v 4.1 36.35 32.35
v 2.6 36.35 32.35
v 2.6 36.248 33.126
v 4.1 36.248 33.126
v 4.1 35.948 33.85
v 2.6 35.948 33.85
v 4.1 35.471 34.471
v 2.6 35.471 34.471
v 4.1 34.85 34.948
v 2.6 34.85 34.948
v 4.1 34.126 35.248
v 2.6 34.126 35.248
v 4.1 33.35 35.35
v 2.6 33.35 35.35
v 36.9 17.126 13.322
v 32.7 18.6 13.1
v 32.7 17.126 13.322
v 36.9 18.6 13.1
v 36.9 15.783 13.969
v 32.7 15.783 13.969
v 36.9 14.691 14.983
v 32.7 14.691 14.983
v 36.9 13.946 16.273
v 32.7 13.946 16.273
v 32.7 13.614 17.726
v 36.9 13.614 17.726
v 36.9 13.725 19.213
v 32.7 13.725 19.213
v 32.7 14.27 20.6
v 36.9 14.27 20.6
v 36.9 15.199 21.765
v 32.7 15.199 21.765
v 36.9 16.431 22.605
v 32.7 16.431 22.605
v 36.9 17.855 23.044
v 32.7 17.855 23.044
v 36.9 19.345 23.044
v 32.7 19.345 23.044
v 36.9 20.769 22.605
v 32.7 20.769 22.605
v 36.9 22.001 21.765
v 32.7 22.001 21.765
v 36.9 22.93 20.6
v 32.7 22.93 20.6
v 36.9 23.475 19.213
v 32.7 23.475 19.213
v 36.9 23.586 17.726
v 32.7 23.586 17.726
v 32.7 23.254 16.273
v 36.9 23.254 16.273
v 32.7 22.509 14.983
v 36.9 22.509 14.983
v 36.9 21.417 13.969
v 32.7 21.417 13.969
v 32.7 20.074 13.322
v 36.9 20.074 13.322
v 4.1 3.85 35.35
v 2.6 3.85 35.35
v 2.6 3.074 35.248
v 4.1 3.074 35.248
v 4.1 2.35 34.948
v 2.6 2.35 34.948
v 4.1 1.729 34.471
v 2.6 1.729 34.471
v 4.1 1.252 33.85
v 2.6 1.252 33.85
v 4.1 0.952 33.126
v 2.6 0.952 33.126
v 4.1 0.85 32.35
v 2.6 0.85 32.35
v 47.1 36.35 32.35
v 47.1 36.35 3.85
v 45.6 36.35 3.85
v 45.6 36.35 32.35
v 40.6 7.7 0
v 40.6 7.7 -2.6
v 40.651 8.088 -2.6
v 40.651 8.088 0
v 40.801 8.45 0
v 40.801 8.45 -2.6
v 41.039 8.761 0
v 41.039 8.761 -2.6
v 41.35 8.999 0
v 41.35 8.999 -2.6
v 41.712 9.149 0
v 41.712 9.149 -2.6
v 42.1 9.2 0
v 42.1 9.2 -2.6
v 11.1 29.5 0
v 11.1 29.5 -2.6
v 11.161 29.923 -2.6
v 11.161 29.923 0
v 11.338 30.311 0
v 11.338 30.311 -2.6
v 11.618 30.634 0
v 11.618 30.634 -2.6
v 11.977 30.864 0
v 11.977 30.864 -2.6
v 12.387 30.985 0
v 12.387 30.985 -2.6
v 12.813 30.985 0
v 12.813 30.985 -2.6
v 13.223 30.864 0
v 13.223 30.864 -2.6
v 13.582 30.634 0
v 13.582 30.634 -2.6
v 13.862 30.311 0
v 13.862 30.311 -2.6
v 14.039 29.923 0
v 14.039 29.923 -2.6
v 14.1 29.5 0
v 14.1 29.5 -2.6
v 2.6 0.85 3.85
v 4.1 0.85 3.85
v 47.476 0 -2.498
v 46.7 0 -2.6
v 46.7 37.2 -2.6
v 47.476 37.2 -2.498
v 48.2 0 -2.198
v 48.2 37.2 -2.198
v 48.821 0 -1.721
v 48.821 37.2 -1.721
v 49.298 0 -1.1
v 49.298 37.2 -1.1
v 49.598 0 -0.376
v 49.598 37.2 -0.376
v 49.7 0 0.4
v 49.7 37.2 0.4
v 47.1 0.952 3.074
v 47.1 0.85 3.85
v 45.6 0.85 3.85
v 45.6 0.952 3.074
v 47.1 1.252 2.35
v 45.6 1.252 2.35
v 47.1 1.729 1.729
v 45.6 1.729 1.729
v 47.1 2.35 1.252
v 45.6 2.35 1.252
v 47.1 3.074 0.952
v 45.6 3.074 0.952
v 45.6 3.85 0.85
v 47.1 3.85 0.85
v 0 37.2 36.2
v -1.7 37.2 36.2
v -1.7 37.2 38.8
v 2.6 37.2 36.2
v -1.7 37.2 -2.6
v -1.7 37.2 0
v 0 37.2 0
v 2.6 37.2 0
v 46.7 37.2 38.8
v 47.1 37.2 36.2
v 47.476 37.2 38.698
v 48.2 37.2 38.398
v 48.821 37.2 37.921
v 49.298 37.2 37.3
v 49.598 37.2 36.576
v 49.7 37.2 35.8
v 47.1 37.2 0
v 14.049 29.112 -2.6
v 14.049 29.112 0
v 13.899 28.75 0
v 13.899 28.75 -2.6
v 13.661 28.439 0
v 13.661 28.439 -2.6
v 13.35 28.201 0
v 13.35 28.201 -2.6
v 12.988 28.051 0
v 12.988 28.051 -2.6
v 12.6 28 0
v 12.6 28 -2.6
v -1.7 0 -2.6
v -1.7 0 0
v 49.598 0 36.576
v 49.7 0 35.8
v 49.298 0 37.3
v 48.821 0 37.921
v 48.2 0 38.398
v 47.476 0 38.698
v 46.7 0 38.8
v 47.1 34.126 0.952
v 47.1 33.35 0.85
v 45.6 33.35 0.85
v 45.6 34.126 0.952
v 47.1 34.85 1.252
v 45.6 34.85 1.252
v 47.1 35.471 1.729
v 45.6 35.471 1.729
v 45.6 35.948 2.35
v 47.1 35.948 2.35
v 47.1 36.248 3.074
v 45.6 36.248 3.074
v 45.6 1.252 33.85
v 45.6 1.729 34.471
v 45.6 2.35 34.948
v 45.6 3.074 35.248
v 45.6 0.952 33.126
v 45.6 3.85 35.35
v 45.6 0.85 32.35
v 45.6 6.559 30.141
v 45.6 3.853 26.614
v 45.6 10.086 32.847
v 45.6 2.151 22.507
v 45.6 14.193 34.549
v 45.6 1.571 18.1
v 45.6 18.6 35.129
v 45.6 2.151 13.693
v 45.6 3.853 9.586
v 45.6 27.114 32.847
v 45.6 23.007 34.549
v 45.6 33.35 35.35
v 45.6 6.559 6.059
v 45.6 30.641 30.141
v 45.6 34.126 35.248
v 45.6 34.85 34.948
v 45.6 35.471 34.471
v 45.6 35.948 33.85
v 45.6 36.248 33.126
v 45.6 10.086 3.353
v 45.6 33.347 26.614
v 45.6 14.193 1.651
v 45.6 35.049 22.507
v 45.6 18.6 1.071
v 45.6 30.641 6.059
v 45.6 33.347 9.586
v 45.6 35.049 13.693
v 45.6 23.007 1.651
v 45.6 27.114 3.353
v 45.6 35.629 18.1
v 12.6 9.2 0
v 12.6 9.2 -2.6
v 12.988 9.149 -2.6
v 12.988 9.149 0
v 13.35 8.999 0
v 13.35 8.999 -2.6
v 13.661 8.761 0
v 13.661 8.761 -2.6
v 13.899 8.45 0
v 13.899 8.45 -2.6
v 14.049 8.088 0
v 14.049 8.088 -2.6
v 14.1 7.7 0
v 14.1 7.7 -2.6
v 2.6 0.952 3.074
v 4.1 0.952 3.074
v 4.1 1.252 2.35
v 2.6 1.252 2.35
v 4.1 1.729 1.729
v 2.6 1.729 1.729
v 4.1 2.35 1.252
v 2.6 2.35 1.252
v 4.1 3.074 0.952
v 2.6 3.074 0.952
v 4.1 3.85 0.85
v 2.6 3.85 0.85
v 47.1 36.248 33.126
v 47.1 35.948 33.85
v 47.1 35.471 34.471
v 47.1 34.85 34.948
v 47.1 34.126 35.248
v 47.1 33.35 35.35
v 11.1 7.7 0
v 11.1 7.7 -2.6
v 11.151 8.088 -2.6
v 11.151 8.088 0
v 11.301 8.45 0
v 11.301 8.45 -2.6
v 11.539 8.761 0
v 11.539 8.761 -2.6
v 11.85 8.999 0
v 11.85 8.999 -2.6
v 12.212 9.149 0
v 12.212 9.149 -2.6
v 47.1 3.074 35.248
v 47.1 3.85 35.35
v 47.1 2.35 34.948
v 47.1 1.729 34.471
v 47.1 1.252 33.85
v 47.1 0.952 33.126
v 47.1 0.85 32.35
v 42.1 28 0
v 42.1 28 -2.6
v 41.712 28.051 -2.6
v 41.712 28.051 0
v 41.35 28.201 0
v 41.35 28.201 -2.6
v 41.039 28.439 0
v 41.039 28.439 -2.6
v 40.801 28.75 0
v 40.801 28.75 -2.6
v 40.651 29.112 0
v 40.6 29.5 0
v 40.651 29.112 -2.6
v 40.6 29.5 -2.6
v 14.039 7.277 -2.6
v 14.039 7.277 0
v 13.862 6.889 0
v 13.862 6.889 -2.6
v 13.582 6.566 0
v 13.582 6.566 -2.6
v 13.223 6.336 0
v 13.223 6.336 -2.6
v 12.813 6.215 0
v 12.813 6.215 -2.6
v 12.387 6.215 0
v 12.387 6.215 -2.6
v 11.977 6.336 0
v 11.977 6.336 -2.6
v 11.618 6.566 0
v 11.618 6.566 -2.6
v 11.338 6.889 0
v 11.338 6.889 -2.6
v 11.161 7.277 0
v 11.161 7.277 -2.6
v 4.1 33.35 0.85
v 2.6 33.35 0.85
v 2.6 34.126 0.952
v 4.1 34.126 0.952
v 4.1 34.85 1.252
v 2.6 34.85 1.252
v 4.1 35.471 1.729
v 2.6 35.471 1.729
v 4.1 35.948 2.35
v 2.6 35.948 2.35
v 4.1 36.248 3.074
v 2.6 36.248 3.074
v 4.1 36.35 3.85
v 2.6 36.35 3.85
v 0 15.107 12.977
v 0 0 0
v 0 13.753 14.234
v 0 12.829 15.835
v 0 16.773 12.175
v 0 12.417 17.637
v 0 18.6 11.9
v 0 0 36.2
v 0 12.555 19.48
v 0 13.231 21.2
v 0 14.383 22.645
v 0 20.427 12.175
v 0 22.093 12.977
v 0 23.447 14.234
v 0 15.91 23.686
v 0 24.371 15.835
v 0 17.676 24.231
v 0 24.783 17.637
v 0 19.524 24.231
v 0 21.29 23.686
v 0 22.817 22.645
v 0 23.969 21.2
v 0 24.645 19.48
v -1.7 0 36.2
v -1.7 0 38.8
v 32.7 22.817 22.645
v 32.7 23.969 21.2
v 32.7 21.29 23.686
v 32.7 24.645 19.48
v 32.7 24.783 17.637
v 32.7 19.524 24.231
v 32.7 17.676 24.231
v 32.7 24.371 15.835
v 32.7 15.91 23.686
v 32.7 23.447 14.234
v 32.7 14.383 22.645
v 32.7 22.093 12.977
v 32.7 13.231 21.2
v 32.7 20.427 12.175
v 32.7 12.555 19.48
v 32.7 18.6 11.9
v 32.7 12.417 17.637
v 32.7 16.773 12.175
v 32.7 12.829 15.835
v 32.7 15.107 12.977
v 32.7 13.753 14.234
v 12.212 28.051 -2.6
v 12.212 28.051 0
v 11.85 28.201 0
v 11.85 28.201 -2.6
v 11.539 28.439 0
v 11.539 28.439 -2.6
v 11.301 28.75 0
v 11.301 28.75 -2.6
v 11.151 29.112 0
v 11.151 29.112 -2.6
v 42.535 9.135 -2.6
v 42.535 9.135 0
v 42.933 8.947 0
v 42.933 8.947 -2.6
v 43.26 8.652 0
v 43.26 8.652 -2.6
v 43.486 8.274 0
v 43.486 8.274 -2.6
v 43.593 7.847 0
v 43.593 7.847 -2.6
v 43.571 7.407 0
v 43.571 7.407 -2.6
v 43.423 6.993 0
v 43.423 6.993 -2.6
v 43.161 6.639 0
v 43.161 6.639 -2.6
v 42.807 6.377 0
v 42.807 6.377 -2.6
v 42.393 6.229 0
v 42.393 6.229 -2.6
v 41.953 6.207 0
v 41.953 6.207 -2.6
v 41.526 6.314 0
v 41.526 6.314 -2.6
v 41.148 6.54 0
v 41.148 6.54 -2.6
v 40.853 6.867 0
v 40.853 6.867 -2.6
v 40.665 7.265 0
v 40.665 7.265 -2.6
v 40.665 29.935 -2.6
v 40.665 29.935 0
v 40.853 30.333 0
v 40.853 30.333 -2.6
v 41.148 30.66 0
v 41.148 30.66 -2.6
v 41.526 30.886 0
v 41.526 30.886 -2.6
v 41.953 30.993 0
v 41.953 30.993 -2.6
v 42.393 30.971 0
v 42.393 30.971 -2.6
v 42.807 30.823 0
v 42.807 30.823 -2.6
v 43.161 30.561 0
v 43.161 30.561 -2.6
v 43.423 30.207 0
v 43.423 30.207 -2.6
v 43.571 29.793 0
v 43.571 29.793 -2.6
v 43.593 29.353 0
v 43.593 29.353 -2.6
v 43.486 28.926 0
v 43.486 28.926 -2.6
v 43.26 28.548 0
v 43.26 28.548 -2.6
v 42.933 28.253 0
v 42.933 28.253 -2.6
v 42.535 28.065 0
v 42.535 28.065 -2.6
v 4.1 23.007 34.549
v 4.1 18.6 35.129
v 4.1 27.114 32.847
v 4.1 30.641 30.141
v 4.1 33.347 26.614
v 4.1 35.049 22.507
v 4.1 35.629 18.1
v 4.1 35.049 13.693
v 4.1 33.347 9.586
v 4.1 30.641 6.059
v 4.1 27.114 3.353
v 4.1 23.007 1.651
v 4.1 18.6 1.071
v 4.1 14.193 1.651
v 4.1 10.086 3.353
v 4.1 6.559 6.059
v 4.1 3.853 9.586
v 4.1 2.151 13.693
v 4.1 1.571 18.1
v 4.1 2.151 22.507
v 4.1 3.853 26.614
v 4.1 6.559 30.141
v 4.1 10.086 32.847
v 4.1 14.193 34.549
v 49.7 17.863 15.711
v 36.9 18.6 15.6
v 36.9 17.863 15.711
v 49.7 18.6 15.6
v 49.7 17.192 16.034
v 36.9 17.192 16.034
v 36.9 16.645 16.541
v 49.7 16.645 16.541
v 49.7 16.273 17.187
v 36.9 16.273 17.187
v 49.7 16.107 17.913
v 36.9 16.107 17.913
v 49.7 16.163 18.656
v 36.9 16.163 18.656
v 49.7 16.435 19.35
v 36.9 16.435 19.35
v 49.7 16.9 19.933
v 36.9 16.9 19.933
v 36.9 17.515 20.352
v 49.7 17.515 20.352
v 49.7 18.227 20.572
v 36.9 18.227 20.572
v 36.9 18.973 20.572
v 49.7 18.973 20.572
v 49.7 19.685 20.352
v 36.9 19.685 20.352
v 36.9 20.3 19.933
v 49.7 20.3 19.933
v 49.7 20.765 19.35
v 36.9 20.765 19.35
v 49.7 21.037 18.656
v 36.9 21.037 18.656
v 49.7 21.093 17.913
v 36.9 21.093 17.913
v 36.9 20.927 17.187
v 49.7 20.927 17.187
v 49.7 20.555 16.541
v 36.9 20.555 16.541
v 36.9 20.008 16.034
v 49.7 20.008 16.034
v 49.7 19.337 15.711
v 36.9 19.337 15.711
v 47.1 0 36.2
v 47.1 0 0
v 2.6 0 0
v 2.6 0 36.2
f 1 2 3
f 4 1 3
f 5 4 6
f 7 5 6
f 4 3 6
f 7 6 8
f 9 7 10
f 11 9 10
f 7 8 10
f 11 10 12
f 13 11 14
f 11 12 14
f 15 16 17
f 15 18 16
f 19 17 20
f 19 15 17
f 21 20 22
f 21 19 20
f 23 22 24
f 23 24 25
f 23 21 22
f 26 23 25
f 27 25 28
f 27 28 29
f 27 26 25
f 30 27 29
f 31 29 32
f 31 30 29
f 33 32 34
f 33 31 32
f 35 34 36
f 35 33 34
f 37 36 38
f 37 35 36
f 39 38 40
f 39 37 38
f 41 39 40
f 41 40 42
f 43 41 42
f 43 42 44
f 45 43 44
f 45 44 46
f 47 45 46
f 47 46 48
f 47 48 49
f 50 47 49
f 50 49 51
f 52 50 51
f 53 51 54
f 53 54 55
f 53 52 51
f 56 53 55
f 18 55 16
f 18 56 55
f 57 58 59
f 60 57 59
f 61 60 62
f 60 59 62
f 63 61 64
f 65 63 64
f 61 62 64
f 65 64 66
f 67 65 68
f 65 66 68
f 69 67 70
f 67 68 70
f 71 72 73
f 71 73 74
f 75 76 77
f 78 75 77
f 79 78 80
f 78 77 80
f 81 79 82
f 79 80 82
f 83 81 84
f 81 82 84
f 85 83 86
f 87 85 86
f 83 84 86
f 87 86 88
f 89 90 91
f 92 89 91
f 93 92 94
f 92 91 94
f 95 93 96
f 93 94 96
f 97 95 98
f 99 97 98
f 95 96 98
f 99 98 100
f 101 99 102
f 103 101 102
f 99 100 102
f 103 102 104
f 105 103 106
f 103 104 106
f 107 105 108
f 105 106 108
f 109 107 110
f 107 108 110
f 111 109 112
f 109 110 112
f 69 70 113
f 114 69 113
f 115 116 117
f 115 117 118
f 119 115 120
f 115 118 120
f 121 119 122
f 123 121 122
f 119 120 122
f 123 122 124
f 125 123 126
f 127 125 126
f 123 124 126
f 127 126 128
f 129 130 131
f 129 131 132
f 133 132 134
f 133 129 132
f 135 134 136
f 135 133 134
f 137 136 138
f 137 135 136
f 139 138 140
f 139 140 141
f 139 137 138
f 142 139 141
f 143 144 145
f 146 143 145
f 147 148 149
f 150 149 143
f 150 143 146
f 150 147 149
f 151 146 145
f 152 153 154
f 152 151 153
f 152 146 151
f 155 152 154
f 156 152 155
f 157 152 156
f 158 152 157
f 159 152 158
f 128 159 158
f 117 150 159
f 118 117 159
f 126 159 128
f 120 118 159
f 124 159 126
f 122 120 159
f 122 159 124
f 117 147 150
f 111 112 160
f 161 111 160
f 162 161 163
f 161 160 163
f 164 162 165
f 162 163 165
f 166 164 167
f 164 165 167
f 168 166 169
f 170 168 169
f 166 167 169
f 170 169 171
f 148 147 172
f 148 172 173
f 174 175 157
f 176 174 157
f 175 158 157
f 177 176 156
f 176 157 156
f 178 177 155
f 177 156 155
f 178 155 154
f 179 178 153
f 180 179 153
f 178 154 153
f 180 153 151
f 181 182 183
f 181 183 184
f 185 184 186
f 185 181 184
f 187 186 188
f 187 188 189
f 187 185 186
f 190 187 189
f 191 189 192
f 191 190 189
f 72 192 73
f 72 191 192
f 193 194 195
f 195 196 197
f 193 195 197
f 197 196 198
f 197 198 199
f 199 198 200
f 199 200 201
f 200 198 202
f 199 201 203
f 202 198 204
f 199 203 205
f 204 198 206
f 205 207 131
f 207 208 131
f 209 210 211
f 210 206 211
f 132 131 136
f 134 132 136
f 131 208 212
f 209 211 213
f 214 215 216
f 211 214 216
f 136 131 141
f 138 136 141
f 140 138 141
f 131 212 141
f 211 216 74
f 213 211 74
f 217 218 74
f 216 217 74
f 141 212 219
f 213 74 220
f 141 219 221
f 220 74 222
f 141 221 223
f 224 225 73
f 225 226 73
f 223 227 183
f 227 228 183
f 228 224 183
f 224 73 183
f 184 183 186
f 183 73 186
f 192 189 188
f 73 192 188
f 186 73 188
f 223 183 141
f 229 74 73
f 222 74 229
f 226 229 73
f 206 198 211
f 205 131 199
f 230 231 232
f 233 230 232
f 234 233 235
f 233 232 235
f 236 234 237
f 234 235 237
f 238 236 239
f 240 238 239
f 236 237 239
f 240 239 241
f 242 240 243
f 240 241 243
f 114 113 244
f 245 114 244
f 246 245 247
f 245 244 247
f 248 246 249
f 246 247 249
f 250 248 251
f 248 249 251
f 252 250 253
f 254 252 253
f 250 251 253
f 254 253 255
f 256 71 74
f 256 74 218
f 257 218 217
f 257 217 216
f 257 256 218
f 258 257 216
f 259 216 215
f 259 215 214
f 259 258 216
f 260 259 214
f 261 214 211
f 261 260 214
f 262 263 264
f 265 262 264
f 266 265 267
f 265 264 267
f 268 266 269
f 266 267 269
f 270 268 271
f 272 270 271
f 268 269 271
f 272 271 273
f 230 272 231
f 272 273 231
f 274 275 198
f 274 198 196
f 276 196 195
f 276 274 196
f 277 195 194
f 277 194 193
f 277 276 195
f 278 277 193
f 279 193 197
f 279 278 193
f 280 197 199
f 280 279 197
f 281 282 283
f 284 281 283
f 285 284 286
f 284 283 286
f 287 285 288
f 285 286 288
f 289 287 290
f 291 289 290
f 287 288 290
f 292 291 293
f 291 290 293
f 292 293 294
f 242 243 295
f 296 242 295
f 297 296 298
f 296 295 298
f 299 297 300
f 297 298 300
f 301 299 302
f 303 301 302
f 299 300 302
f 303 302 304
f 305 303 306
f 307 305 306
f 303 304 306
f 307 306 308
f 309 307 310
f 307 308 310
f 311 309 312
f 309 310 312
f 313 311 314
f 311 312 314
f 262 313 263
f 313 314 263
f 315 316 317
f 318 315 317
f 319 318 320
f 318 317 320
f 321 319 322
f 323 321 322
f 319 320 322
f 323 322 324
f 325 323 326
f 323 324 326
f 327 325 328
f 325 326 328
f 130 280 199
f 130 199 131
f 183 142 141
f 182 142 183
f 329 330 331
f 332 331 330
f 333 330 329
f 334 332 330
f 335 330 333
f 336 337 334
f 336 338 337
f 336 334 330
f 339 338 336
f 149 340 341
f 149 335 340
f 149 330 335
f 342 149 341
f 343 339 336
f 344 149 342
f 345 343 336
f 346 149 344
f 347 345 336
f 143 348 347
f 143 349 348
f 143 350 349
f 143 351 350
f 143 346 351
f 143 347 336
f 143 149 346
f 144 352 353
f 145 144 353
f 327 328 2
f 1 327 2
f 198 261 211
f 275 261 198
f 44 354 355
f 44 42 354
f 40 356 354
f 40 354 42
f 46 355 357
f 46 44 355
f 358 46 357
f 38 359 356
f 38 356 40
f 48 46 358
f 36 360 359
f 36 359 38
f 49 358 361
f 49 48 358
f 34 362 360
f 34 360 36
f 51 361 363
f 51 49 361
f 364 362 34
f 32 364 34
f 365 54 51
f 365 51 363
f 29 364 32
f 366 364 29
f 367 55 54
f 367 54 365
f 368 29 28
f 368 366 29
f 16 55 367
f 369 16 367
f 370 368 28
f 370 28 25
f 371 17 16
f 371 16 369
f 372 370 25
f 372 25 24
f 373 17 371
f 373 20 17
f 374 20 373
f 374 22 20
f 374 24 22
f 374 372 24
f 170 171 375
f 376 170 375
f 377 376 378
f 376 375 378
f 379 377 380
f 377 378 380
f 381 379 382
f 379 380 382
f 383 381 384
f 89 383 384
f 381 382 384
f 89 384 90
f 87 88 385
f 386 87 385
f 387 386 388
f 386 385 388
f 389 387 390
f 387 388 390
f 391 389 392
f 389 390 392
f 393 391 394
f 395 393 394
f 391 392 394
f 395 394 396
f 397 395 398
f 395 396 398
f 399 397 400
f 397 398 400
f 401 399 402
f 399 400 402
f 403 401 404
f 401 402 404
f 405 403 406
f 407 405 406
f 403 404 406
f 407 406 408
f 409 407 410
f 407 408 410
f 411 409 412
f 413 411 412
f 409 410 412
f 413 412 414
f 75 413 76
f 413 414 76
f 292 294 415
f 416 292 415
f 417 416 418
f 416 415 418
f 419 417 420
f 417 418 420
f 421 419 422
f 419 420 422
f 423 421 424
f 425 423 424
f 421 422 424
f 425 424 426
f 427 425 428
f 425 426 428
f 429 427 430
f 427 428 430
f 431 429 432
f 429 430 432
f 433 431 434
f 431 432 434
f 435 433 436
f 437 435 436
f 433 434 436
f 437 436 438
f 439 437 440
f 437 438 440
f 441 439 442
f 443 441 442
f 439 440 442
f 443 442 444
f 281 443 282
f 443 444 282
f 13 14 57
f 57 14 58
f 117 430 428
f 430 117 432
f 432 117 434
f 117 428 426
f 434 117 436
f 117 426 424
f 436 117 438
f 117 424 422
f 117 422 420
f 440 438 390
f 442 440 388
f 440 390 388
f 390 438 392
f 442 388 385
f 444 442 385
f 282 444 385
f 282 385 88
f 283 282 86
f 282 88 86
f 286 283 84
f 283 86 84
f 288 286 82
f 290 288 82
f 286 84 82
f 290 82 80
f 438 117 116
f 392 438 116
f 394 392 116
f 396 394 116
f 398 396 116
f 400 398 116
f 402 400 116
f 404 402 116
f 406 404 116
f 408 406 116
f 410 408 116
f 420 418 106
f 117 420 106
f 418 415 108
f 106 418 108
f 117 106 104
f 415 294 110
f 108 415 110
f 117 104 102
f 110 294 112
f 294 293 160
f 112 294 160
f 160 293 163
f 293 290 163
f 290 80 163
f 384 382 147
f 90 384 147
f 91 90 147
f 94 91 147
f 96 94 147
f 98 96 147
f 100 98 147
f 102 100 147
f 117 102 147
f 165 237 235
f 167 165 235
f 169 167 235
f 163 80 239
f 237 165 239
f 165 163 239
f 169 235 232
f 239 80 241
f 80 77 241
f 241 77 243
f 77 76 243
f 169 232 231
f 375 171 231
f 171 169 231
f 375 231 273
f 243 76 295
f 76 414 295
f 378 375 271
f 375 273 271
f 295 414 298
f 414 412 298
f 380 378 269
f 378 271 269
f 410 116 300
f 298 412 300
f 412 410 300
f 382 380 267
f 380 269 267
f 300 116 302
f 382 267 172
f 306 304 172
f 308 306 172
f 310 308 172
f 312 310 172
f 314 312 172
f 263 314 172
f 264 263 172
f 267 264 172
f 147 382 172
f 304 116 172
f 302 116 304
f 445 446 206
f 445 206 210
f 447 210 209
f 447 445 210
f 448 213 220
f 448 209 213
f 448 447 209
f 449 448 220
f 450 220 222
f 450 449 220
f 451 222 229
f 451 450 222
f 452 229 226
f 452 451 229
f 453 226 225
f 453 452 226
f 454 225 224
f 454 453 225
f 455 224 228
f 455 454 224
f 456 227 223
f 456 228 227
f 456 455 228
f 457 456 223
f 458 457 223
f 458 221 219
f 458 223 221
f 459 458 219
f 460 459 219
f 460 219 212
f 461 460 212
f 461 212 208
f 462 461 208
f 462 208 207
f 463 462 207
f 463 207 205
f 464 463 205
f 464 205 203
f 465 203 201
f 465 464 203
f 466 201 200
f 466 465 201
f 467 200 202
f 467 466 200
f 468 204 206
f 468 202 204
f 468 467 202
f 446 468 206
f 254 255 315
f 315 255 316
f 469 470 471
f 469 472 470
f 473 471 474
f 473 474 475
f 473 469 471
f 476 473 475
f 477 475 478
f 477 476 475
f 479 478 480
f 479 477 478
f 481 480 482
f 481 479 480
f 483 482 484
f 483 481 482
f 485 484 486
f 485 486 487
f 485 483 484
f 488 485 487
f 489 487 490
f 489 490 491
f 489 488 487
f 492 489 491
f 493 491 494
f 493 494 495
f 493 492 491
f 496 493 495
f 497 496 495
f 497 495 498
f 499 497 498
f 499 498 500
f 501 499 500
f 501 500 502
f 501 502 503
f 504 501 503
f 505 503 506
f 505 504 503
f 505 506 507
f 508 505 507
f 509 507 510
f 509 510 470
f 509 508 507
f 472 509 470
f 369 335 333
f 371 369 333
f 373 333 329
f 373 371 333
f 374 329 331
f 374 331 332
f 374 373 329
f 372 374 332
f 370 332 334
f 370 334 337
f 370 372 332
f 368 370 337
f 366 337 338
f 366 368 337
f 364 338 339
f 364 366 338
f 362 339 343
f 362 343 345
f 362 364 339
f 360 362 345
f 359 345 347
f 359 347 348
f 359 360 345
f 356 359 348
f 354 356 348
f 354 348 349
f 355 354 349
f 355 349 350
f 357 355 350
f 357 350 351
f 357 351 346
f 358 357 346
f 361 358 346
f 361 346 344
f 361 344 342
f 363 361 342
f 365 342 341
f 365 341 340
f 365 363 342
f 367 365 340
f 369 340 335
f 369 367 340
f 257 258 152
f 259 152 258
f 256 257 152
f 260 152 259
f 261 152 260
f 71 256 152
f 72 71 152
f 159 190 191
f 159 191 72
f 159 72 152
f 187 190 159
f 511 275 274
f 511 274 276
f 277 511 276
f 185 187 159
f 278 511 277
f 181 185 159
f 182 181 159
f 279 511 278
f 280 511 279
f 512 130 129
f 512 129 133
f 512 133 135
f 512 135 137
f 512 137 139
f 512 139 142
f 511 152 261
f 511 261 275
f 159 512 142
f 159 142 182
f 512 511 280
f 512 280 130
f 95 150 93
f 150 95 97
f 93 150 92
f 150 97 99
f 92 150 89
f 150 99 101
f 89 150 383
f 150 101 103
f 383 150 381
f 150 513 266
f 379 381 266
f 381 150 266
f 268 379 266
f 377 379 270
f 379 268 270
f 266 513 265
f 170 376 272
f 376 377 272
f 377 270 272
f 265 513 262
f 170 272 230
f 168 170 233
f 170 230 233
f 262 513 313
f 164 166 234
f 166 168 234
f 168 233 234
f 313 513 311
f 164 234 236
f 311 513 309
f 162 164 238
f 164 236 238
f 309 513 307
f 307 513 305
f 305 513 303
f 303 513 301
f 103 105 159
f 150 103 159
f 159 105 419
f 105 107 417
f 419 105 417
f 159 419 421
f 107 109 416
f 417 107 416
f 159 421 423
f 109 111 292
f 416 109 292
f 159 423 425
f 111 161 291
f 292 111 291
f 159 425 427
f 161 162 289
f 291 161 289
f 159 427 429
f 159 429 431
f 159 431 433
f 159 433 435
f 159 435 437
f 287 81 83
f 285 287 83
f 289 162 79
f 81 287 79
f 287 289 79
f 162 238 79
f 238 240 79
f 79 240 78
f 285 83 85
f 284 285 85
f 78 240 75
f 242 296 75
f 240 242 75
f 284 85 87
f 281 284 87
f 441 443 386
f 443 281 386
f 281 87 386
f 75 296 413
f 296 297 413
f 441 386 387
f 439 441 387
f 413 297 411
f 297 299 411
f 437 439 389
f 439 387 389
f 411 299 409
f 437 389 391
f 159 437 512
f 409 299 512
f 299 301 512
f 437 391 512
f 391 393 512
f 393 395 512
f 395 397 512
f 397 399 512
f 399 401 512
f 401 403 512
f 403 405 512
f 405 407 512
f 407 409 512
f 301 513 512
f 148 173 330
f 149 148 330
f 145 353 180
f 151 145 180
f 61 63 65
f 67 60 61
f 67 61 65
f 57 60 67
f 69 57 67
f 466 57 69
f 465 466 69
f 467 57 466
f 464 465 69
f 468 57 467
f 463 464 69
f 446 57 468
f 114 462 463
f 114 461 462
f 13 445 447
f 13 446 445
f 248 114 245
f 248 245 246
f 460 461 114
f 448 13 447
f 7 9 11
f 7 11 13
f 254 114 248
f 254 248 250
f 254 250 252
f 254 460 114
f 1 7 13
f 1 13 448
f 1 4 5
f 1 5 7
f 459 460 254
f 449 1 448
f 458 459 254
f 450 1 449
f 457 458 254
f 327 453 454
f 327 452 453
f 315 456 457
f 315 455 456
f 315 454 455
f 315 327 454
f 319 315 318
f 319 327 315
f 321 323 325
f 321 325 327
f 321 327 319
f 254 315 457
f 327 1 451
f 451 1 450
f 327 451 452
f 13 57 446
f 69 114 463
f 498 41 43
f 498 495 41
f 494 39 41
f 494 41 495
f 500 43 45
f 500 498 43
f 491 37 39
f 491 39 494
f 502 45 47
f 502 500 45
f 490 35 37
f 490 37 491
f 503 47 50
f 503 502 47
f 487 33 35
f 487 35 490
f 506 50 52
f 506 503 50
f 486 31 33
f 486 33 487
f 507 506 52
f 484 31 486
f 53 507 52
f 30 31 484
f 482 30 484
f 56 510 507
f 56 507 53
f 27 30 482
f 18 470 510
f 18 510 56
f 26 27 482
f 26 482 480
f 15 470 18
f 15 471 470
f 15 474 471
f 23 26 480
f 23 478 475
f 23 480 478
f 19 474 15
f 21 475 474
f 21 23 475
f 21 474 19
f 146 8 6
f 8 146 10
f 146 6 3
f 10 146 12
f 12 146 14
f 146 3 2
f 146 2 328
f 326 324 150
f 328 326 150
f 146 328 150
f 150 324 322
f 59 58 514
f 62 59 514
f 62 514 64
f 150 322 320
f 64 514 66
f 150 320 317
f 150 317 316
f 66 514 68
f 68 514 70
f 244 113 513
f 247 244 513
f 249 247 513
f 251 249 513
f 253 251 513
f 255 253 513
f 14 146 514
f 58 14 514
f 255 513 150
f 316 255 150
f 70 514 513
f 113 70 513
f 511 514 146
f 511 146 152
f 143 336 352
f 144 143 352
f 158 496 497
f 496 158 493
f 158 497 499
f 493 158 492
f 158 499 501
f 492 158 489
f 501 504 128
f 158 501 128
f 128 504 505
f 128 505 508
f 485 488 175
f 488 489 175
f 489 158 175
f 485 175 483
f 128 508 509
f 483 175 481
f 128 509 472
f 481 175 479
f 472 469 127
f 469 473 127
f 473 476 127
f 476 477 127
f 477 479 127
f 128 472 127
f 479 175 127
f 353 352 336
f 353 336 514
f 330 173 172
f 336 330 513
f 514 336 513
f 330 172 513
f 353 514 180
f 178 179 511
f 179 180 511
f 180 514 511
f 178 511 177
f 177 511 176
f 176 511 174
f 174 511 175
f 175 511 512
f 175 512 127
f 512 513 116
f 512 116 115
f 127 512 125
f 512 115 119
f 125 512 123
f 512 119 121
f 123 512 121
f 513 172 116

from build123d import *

# Parameters (mm, degrees)
CROQUIS1_W              = 44.5
CROQUIS1_H              = 36.2
SALIENTE_EXTRUIR1_DEPTH = 37.2
CROQUIS2_R              = 17.028823748
SALIENTE_EXTRUIR2_DEPTH = 47.1
CROQUIS3_R              = 17.028823748
SALIENTE_EXTRUIR3_DEPTH = 1.5
REDONDEO1_R             = 3
REDONDEO2_R             = 3
CORTAR_EXTRUIR1_DEPTH   = 2.6


with BuildPart() as part:
    # Croquis1 → Saliente-Extruir1 (new body)
    with BuildSketch(Plane(origin=(0, 0, 0), x_dir=(1, 0, 0), z_dir=(0, 1, 0))):
        Polygon((0, 0), (0, -36.2), (-1.7, -36.2), (-1.7, -38.8), (49.7, -38.8), (49.7, 2.6), (-1.7, 2.6), (-1.7, 0), align=None)
        with Locations((24.85, -18.1)):
            Rectangle(CROQUIS1_W, CROQUIS1_H, mode=Mode.SUBTRACT)
    extrude(amount=SALIENTE_EXTRUIR1_DEPTH)

    # Croquis2 → Saliente-Extruir2 (add)
    with BuildSketch(Plane.ZY):
        with Locations((18.1, 18.6)):
            Circle(CROQUIS2_R)
    extrude(amount=-SALIENTE_EXTRUIR2_DEPTH)

    # Croquis3 → Saliente-Extruir3 (add)
    with BuildSketch(Plane(origin=(2.6, 0, 0), x_dir=(0, 0, -1), z_dir=(1, 0, 0))):
        with BuildLine():
            Line((-0.85, 3.85), (-0.85, 33.35))
            ThreePointArc((-0.85, 33.35), (-1.728679656, 35.471320344), (-3.85, 36.35))
            Line((-3.85, 36.35), (-32.35, 36.35))
            ThreePointArc((-32.35, 36.35), (-34.471320344, 35.471320344), (-35.35, 33.35))
            Line((-35.35, 33.35), (-35.35, 3.85))
            ThreePointArc((-35.35, 3.85), (-34.471320344, 1.728679656), (-32.35, 0.85))
            Line((-32.35, 0.85), (-3.85, 0.85))
            ThreePointArc((-3.85, 0.85), (-1.728679656, 1.728679656), (-0.85, 3.85))
        make_face()
        with Locations(Location((-18.1, 18.6, 0), (0, 0, 180))):
            Circle(CROQUIS3_R, mode=Mode.SUBTRACT)
    saliente_extruir3 = extrude(amount=SALIENTE_EXTRUIR3_DEPTH)

    # Simetría1: Saliente-Extruir3 across plane
    add(saliente_extruir3.mirror(Plane(origin=(24.85, 0, 0), x_dir=(0, 0, 1), z_dir=(1, 0, 0))))

    # Croquis4 → Cortar-Revolución1 (revolve, cut)
    with BuildSketch(Plane(origin=(0, 18.6, 0), x_dir=(1, 0, 0), z_dir=(0, 1, 0))):
        Polygon((49.7, -18.1), (0, -18.1), (0, -11.9), (32.7, -11.9), (32.7, -13.1), (36.9, -13.1), (36.9, -15.6), (49.7, -15.6), align=None)
    revolve(axis=Axis((49.7, 18.6, 18.1), (-1, 0, 0)), mode=Mode.SUBTRACT)

    # Redondeo1
    redondeo1_edges = [part.edges().sort_by_distance(p)[0] for p in [
        (49.7, 18.6, -2.6),
    ]]
    fillet(redondeo1_edges, radius=REDONDEO1_R)

    # Redondeo2
    redondeo2_edges = [part.edges().sort_by_distance(p)[0] for p in [
        (49.7, 18.6, 38.8),
    ]]
    fillet(redondeo2_edges, radius=REDONDEO2_R)

    # Croquis5 → Cortar-Extruir1 (cut)
    with BuildSketch(Plane(origin=(0, 0, -2.6), x_dir=(-1, 0, 0), z_dir=(0, 0, -1))):
        with BuildLine():
            Line((-42.1, 28), (-42.1, 29.5))
            Line((-42.1, 29.5), (-40.6, 29.5))
            ThreePointArc((-40.6, 29.5), (-43.160660172, 30.560660172), (-42.1, 28))
        make_face()
        with BuildLine():
            Line((-40.6, 29.5), (-42.1, 29.5))
            Line((-42.1, 29.5), (-42.1, 28))
            ThreePointArc((-42.1, 28), (-41.039339828, 28.439339828), (-40.6, 29.5))
        make_face()
        with BuildLine():
            ThreePointArc((-40.6, 7.7), (-41.039339828, 8.760660172), (-42.1, 9.2))
            Line((-42.1, 9.2), (-42.1, 7.7))
            Line((-42.1, 7.7), (-40.6, 7.7))
        make_face()
        with BuildLine():
            Line((-42.1, 7.7), (-42.1, 9.2))
            ThreePointArc((-42.1, 9.2), (-43.160660172, 6.639339828), (-40.6, 7.7))
            Line((-40.6, 7.7), (-42.1, 7.7))
        make_face()
        with BuildLine():
            ThreePointArc((-11.1, 7.7), (-11.539339828, 8.760660172), (-12.6, 9.2))
            Line((-12.6, 9.2), (-12.6, 7.7))
            Line((-12.6, 7.7), (-14.1, 7.7))
            ThreePointArc((-14.1, 7.7), (-12.6, 6.2), (-11.1, 7.7))
        make_face()
        with BuildLine():
            Line((-12.6, 7.7), (-12.6, 9.2))
            ThreePointArc((-12.6, 9.2), (-13.660660172, 8.760660172), (-14.1, 7.7))
            Line((-14.1, 7.7), (-12.6, 7.7))
        make_face()
        with BuildLine():
            ThreePointArc((-11.1, 29.5), (-12.6, 31), (-14.1, 29.5))
            Line((-14.1, 29.5), (-12.6, 29.5))
            Line((-12.6, 29.5), (-12.6, 28))
            ThreePointArc((-12.6, 28), (-11.539339828, 28.439339828), (-11.1, 29.5))
        make_face()
        with BuildLine():
            Line((-12.6, 29.5), (-14.1, 29.5))
            ThreePointArc((-14.1, 29.5), (-13.660660172, 28.439339828), (-12.6, 28))
            Line((-12.6, 28), (-12.6, 29.5))
        make_face()
    extrude(amount=-CORTAR_EXTRUIR1_DEPTH, mode=Mode.SUBTRACT)


solid = part.part
